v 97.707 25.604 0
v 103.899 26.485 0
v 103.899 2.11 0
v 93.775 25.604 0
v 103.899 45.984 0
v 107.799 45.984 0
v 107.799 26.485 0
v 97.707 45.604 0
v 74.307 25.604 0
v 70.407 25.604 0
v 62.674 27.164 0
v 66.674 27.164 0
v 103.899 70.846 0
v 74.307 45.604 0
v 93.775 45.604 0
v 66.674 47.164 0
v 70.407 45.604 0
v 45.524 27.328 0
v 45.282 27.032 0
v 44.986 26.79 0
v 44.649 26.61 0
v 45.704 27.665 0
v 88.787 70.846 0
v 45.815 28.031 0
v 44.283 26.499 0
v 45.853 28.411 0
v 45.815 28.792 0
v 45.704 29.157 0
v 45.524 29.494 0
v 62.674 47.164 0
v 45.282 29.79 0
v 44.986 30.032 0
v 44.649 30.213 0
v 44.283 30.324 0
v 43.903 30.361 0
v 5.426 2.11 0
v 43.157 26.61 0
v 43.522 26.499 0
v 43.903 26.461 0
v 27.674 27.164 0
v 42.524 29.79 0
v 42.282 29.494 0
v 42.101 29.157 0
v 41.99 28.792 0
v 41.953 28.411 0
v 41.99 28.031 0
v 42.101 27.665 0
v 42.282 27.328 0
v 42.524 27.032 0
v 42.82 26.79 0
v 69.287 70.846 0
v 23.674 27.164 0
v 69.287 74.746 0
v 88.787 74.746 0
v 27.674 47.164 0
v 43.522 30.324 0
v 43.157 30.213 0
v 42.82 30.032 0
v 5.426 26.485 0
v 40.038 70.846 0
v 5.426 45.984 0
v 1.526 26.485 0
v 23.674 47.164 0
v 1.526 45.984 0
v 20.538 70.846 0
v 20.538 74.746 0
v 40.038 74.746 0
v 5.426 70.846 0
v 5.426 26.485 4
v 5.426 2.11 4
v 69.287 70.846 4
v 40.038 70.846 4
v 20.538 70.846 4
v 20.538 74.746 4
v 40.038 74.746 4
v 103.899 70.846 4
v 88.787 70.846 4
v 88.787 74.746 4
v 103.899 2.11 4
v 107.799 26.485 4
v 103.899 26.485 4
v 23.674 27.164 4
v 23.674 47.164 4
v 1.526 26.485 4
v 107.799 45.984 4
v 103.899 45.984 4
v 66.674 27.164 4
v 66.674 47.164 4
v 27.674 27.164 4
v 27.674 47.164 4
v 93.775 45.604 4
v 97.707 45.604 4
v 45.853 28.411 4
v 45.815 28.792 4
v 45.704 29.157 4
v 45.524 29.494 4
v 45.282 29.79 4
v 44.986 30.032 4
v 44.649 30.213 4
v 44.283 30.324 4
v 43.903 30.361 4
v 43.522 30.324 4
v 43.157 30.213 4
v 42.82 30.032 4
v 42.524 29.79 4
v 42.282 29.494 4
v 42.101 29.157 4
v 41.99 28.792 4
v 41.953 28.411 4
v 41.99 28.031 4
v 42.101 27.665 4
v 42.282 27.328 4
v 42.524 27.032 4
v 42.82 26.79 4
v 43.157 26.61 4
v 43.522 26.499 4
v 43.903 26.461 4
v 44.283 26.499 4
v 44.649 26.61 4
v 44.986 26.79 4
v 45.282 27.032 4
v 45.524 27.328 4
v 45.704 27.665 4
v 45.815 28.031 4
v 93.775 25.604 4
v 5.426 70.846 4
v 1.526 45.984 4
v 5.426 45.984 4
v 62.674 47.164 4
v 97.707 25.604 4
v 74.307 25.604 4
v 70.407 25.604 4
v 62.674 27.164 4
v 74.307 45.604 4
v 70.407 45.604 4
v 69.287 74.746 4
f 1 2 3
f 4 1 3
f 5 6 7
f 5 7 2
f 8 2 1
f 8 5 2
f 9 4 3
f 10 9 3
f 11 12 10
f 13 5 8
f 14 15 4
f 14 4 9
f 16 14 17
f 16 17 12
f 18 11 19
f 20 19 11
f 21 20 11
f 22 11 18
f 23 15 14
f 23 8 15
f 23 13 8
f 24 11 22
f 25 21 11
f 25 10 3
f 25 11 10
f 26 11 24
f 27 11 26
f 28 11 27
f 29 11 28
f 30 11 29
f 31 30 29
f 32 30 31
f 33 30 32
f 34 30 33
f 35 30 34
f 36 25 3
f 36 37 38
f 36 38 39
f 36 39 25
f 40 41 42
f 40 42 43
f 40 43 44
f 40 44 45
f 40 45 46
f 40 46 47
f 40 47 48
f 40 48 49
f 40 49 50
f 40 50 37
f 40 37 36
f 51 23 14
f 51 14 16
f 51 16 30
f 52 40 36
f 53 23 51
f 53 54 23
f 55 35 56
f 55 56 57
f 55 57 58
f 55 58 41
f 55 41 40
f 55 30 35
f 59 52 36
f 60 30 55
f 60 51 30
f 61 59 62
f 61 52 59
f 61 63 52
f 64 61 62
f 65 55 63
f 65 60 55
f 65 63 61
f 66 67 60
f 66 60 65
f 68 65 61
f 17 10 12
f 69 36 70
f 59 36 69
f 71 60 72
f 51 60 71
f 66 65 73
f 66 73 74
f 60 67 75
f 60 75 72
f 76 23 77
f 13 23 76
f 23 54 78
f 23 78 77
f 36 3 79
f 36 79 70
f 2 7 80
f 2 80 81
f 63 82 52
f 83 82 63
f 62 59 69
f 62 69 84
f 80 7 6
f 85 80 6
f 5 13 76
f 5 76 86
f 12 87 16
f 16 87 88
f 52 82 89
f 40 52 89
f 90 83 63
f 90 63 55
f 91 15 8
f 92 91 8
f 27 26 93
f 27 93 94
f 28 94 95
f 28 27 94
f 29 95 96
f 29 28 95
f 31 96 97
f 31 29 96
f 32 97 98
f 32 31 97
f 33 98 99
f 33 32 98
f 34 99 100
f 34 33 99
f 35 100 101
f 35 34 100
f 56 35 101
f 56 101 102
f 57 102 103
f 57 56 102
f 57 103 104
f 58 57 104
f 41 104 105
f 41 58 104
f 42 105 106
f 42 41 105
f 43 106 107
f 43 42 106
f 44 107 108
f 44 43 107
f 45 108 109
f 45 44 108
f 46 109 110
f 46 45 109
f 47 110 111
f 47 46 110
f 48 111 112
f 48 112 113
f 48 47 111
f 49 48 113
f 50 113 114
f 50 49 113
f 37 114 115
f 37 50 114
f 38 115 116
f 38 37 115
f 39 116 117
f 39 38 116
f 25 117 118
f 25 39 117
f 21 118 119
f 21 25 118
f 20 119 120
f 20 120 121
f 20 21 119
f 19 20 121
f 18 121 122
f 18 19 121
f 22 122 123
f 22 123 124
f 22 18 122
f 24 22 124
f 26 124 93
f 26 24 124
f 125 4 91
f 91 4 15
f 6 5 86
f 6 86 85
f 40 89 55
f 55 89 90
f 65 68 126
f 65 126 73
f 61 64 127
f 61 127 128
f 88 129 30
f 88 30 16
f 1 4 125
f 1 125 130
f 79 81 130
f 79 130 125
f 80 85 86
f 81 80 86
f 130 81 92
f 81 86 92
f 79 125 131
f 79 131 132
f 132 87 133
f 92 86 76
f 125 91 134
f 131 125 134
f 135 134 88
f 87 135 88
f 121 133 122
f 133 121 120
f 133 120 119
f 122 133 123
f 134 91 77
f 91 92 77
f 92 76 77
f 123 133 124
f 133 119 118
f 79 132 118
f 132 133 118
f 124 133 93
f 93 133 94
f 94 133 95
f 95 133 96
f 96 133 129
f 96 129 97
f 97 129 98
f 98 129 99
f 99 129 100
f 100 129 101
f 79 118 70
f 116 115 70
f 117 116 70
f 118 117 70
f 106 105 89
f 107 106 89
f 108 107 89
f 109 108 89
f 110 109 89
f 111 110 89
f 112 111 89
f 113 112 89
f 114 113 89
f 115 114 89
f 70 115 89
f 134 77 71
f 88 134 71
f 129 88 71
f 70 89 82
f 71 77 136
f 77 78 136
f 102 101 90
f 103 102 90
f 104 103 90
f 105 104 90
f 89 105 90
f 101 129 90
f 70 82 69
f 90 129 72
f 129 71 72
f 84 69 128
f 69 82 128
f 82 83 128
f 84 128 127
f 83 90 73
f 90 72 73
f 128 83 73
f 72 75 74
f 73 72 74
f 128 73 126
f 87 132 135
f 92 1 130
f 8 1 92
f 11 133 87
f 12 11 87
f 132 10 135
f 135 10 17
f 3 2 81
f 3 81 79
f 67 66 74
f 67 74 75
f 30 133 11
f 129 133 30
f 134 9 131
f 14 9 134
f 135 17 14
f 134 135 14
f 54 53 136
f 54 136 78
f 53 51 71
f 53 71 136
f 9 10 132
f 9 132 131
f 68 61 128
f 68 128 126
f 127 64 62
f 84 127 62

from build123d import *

# Parameters (mm, degrees)
CROQUIS1_R              = 1.949957096
CROQUIS1_W              = 3.899914193
CROQUIS1_H              = 20
CROQUIS1_W_2            = 3.931890122
SALIENTE_EXTRUIR1_DEPTH = 4
CROQUIS3_W              = 4
CROQUIS3_H              = 20
CORTAR_EXTRUIR2_DEPTH   = 18


with BuildPart() as part:
    # Croquis1 → Saliente-Extruir1 (new body)
    with BuildSketch(Plane.XY):
        Polygon((1.526053109, 36.234397526), (1.526053109, 45.984183007), (5.425967302, 45.984183007), (5.425967302, 70.846135986), (20.538134799, 70.846135986), (20.538134799, 74.746050179), (40.037705762, 74.746050179), (40.037705762, 70.846135986), (69.287062208, 70.846135986), (69.287062208, 74.746050179), (88.786633171, 74.746050179), (88.786633171, 70.846135986), (103.898800668, 70.846135986), (103.898800668, 45.984183007), (107.798714861, 45.984183007), (107.798714861, 36.234397526), (107.798714861, 26.484612044), (103.898800668, 26.484612044), (103.898800668, 2.110148339), (5.425967302, 2.110148339), (5.425967302, 26.484612044), (1.526053109, 26.484612044), align=None)
        with Locations((43.902907702, 28.411154562)):
            Circle(CROQUIS1_R, mode=Mode.SUBTRACT)
        with Locations((72.35718349, 35.603908164)):
            Rectangle(CROQUIS1_W, CROQUIS1_H, mode=Mode.SUBTRACT)
        with Locations((95.740680681, 35.603908164)):
            Rectangle(CROQUIS1_W_2, CROQUIS1_H, mode=Mode.SUBTRACT)
    extrude(amount=SALIENTE_EXTRUIR1_DEPTH)

    # Croquis3 → Cortar-Extruir2 (cut)
    with BuildSketch(Plane.XY.offset(4)):
        with Locations((64.674115468, 37.164302326)):
            Rectangle(CROQUIS3_W, CROQUIS3_H)
        with Locations((25.674115468, 37.164302326)):
            Rectangle(CROQUIS3_W, CROQUIS3_H)
    extrude(amount=-CORTAR_EXTRUIR2_DEPTH, mode=Mode.SUBTRACT)


solid = part.part
